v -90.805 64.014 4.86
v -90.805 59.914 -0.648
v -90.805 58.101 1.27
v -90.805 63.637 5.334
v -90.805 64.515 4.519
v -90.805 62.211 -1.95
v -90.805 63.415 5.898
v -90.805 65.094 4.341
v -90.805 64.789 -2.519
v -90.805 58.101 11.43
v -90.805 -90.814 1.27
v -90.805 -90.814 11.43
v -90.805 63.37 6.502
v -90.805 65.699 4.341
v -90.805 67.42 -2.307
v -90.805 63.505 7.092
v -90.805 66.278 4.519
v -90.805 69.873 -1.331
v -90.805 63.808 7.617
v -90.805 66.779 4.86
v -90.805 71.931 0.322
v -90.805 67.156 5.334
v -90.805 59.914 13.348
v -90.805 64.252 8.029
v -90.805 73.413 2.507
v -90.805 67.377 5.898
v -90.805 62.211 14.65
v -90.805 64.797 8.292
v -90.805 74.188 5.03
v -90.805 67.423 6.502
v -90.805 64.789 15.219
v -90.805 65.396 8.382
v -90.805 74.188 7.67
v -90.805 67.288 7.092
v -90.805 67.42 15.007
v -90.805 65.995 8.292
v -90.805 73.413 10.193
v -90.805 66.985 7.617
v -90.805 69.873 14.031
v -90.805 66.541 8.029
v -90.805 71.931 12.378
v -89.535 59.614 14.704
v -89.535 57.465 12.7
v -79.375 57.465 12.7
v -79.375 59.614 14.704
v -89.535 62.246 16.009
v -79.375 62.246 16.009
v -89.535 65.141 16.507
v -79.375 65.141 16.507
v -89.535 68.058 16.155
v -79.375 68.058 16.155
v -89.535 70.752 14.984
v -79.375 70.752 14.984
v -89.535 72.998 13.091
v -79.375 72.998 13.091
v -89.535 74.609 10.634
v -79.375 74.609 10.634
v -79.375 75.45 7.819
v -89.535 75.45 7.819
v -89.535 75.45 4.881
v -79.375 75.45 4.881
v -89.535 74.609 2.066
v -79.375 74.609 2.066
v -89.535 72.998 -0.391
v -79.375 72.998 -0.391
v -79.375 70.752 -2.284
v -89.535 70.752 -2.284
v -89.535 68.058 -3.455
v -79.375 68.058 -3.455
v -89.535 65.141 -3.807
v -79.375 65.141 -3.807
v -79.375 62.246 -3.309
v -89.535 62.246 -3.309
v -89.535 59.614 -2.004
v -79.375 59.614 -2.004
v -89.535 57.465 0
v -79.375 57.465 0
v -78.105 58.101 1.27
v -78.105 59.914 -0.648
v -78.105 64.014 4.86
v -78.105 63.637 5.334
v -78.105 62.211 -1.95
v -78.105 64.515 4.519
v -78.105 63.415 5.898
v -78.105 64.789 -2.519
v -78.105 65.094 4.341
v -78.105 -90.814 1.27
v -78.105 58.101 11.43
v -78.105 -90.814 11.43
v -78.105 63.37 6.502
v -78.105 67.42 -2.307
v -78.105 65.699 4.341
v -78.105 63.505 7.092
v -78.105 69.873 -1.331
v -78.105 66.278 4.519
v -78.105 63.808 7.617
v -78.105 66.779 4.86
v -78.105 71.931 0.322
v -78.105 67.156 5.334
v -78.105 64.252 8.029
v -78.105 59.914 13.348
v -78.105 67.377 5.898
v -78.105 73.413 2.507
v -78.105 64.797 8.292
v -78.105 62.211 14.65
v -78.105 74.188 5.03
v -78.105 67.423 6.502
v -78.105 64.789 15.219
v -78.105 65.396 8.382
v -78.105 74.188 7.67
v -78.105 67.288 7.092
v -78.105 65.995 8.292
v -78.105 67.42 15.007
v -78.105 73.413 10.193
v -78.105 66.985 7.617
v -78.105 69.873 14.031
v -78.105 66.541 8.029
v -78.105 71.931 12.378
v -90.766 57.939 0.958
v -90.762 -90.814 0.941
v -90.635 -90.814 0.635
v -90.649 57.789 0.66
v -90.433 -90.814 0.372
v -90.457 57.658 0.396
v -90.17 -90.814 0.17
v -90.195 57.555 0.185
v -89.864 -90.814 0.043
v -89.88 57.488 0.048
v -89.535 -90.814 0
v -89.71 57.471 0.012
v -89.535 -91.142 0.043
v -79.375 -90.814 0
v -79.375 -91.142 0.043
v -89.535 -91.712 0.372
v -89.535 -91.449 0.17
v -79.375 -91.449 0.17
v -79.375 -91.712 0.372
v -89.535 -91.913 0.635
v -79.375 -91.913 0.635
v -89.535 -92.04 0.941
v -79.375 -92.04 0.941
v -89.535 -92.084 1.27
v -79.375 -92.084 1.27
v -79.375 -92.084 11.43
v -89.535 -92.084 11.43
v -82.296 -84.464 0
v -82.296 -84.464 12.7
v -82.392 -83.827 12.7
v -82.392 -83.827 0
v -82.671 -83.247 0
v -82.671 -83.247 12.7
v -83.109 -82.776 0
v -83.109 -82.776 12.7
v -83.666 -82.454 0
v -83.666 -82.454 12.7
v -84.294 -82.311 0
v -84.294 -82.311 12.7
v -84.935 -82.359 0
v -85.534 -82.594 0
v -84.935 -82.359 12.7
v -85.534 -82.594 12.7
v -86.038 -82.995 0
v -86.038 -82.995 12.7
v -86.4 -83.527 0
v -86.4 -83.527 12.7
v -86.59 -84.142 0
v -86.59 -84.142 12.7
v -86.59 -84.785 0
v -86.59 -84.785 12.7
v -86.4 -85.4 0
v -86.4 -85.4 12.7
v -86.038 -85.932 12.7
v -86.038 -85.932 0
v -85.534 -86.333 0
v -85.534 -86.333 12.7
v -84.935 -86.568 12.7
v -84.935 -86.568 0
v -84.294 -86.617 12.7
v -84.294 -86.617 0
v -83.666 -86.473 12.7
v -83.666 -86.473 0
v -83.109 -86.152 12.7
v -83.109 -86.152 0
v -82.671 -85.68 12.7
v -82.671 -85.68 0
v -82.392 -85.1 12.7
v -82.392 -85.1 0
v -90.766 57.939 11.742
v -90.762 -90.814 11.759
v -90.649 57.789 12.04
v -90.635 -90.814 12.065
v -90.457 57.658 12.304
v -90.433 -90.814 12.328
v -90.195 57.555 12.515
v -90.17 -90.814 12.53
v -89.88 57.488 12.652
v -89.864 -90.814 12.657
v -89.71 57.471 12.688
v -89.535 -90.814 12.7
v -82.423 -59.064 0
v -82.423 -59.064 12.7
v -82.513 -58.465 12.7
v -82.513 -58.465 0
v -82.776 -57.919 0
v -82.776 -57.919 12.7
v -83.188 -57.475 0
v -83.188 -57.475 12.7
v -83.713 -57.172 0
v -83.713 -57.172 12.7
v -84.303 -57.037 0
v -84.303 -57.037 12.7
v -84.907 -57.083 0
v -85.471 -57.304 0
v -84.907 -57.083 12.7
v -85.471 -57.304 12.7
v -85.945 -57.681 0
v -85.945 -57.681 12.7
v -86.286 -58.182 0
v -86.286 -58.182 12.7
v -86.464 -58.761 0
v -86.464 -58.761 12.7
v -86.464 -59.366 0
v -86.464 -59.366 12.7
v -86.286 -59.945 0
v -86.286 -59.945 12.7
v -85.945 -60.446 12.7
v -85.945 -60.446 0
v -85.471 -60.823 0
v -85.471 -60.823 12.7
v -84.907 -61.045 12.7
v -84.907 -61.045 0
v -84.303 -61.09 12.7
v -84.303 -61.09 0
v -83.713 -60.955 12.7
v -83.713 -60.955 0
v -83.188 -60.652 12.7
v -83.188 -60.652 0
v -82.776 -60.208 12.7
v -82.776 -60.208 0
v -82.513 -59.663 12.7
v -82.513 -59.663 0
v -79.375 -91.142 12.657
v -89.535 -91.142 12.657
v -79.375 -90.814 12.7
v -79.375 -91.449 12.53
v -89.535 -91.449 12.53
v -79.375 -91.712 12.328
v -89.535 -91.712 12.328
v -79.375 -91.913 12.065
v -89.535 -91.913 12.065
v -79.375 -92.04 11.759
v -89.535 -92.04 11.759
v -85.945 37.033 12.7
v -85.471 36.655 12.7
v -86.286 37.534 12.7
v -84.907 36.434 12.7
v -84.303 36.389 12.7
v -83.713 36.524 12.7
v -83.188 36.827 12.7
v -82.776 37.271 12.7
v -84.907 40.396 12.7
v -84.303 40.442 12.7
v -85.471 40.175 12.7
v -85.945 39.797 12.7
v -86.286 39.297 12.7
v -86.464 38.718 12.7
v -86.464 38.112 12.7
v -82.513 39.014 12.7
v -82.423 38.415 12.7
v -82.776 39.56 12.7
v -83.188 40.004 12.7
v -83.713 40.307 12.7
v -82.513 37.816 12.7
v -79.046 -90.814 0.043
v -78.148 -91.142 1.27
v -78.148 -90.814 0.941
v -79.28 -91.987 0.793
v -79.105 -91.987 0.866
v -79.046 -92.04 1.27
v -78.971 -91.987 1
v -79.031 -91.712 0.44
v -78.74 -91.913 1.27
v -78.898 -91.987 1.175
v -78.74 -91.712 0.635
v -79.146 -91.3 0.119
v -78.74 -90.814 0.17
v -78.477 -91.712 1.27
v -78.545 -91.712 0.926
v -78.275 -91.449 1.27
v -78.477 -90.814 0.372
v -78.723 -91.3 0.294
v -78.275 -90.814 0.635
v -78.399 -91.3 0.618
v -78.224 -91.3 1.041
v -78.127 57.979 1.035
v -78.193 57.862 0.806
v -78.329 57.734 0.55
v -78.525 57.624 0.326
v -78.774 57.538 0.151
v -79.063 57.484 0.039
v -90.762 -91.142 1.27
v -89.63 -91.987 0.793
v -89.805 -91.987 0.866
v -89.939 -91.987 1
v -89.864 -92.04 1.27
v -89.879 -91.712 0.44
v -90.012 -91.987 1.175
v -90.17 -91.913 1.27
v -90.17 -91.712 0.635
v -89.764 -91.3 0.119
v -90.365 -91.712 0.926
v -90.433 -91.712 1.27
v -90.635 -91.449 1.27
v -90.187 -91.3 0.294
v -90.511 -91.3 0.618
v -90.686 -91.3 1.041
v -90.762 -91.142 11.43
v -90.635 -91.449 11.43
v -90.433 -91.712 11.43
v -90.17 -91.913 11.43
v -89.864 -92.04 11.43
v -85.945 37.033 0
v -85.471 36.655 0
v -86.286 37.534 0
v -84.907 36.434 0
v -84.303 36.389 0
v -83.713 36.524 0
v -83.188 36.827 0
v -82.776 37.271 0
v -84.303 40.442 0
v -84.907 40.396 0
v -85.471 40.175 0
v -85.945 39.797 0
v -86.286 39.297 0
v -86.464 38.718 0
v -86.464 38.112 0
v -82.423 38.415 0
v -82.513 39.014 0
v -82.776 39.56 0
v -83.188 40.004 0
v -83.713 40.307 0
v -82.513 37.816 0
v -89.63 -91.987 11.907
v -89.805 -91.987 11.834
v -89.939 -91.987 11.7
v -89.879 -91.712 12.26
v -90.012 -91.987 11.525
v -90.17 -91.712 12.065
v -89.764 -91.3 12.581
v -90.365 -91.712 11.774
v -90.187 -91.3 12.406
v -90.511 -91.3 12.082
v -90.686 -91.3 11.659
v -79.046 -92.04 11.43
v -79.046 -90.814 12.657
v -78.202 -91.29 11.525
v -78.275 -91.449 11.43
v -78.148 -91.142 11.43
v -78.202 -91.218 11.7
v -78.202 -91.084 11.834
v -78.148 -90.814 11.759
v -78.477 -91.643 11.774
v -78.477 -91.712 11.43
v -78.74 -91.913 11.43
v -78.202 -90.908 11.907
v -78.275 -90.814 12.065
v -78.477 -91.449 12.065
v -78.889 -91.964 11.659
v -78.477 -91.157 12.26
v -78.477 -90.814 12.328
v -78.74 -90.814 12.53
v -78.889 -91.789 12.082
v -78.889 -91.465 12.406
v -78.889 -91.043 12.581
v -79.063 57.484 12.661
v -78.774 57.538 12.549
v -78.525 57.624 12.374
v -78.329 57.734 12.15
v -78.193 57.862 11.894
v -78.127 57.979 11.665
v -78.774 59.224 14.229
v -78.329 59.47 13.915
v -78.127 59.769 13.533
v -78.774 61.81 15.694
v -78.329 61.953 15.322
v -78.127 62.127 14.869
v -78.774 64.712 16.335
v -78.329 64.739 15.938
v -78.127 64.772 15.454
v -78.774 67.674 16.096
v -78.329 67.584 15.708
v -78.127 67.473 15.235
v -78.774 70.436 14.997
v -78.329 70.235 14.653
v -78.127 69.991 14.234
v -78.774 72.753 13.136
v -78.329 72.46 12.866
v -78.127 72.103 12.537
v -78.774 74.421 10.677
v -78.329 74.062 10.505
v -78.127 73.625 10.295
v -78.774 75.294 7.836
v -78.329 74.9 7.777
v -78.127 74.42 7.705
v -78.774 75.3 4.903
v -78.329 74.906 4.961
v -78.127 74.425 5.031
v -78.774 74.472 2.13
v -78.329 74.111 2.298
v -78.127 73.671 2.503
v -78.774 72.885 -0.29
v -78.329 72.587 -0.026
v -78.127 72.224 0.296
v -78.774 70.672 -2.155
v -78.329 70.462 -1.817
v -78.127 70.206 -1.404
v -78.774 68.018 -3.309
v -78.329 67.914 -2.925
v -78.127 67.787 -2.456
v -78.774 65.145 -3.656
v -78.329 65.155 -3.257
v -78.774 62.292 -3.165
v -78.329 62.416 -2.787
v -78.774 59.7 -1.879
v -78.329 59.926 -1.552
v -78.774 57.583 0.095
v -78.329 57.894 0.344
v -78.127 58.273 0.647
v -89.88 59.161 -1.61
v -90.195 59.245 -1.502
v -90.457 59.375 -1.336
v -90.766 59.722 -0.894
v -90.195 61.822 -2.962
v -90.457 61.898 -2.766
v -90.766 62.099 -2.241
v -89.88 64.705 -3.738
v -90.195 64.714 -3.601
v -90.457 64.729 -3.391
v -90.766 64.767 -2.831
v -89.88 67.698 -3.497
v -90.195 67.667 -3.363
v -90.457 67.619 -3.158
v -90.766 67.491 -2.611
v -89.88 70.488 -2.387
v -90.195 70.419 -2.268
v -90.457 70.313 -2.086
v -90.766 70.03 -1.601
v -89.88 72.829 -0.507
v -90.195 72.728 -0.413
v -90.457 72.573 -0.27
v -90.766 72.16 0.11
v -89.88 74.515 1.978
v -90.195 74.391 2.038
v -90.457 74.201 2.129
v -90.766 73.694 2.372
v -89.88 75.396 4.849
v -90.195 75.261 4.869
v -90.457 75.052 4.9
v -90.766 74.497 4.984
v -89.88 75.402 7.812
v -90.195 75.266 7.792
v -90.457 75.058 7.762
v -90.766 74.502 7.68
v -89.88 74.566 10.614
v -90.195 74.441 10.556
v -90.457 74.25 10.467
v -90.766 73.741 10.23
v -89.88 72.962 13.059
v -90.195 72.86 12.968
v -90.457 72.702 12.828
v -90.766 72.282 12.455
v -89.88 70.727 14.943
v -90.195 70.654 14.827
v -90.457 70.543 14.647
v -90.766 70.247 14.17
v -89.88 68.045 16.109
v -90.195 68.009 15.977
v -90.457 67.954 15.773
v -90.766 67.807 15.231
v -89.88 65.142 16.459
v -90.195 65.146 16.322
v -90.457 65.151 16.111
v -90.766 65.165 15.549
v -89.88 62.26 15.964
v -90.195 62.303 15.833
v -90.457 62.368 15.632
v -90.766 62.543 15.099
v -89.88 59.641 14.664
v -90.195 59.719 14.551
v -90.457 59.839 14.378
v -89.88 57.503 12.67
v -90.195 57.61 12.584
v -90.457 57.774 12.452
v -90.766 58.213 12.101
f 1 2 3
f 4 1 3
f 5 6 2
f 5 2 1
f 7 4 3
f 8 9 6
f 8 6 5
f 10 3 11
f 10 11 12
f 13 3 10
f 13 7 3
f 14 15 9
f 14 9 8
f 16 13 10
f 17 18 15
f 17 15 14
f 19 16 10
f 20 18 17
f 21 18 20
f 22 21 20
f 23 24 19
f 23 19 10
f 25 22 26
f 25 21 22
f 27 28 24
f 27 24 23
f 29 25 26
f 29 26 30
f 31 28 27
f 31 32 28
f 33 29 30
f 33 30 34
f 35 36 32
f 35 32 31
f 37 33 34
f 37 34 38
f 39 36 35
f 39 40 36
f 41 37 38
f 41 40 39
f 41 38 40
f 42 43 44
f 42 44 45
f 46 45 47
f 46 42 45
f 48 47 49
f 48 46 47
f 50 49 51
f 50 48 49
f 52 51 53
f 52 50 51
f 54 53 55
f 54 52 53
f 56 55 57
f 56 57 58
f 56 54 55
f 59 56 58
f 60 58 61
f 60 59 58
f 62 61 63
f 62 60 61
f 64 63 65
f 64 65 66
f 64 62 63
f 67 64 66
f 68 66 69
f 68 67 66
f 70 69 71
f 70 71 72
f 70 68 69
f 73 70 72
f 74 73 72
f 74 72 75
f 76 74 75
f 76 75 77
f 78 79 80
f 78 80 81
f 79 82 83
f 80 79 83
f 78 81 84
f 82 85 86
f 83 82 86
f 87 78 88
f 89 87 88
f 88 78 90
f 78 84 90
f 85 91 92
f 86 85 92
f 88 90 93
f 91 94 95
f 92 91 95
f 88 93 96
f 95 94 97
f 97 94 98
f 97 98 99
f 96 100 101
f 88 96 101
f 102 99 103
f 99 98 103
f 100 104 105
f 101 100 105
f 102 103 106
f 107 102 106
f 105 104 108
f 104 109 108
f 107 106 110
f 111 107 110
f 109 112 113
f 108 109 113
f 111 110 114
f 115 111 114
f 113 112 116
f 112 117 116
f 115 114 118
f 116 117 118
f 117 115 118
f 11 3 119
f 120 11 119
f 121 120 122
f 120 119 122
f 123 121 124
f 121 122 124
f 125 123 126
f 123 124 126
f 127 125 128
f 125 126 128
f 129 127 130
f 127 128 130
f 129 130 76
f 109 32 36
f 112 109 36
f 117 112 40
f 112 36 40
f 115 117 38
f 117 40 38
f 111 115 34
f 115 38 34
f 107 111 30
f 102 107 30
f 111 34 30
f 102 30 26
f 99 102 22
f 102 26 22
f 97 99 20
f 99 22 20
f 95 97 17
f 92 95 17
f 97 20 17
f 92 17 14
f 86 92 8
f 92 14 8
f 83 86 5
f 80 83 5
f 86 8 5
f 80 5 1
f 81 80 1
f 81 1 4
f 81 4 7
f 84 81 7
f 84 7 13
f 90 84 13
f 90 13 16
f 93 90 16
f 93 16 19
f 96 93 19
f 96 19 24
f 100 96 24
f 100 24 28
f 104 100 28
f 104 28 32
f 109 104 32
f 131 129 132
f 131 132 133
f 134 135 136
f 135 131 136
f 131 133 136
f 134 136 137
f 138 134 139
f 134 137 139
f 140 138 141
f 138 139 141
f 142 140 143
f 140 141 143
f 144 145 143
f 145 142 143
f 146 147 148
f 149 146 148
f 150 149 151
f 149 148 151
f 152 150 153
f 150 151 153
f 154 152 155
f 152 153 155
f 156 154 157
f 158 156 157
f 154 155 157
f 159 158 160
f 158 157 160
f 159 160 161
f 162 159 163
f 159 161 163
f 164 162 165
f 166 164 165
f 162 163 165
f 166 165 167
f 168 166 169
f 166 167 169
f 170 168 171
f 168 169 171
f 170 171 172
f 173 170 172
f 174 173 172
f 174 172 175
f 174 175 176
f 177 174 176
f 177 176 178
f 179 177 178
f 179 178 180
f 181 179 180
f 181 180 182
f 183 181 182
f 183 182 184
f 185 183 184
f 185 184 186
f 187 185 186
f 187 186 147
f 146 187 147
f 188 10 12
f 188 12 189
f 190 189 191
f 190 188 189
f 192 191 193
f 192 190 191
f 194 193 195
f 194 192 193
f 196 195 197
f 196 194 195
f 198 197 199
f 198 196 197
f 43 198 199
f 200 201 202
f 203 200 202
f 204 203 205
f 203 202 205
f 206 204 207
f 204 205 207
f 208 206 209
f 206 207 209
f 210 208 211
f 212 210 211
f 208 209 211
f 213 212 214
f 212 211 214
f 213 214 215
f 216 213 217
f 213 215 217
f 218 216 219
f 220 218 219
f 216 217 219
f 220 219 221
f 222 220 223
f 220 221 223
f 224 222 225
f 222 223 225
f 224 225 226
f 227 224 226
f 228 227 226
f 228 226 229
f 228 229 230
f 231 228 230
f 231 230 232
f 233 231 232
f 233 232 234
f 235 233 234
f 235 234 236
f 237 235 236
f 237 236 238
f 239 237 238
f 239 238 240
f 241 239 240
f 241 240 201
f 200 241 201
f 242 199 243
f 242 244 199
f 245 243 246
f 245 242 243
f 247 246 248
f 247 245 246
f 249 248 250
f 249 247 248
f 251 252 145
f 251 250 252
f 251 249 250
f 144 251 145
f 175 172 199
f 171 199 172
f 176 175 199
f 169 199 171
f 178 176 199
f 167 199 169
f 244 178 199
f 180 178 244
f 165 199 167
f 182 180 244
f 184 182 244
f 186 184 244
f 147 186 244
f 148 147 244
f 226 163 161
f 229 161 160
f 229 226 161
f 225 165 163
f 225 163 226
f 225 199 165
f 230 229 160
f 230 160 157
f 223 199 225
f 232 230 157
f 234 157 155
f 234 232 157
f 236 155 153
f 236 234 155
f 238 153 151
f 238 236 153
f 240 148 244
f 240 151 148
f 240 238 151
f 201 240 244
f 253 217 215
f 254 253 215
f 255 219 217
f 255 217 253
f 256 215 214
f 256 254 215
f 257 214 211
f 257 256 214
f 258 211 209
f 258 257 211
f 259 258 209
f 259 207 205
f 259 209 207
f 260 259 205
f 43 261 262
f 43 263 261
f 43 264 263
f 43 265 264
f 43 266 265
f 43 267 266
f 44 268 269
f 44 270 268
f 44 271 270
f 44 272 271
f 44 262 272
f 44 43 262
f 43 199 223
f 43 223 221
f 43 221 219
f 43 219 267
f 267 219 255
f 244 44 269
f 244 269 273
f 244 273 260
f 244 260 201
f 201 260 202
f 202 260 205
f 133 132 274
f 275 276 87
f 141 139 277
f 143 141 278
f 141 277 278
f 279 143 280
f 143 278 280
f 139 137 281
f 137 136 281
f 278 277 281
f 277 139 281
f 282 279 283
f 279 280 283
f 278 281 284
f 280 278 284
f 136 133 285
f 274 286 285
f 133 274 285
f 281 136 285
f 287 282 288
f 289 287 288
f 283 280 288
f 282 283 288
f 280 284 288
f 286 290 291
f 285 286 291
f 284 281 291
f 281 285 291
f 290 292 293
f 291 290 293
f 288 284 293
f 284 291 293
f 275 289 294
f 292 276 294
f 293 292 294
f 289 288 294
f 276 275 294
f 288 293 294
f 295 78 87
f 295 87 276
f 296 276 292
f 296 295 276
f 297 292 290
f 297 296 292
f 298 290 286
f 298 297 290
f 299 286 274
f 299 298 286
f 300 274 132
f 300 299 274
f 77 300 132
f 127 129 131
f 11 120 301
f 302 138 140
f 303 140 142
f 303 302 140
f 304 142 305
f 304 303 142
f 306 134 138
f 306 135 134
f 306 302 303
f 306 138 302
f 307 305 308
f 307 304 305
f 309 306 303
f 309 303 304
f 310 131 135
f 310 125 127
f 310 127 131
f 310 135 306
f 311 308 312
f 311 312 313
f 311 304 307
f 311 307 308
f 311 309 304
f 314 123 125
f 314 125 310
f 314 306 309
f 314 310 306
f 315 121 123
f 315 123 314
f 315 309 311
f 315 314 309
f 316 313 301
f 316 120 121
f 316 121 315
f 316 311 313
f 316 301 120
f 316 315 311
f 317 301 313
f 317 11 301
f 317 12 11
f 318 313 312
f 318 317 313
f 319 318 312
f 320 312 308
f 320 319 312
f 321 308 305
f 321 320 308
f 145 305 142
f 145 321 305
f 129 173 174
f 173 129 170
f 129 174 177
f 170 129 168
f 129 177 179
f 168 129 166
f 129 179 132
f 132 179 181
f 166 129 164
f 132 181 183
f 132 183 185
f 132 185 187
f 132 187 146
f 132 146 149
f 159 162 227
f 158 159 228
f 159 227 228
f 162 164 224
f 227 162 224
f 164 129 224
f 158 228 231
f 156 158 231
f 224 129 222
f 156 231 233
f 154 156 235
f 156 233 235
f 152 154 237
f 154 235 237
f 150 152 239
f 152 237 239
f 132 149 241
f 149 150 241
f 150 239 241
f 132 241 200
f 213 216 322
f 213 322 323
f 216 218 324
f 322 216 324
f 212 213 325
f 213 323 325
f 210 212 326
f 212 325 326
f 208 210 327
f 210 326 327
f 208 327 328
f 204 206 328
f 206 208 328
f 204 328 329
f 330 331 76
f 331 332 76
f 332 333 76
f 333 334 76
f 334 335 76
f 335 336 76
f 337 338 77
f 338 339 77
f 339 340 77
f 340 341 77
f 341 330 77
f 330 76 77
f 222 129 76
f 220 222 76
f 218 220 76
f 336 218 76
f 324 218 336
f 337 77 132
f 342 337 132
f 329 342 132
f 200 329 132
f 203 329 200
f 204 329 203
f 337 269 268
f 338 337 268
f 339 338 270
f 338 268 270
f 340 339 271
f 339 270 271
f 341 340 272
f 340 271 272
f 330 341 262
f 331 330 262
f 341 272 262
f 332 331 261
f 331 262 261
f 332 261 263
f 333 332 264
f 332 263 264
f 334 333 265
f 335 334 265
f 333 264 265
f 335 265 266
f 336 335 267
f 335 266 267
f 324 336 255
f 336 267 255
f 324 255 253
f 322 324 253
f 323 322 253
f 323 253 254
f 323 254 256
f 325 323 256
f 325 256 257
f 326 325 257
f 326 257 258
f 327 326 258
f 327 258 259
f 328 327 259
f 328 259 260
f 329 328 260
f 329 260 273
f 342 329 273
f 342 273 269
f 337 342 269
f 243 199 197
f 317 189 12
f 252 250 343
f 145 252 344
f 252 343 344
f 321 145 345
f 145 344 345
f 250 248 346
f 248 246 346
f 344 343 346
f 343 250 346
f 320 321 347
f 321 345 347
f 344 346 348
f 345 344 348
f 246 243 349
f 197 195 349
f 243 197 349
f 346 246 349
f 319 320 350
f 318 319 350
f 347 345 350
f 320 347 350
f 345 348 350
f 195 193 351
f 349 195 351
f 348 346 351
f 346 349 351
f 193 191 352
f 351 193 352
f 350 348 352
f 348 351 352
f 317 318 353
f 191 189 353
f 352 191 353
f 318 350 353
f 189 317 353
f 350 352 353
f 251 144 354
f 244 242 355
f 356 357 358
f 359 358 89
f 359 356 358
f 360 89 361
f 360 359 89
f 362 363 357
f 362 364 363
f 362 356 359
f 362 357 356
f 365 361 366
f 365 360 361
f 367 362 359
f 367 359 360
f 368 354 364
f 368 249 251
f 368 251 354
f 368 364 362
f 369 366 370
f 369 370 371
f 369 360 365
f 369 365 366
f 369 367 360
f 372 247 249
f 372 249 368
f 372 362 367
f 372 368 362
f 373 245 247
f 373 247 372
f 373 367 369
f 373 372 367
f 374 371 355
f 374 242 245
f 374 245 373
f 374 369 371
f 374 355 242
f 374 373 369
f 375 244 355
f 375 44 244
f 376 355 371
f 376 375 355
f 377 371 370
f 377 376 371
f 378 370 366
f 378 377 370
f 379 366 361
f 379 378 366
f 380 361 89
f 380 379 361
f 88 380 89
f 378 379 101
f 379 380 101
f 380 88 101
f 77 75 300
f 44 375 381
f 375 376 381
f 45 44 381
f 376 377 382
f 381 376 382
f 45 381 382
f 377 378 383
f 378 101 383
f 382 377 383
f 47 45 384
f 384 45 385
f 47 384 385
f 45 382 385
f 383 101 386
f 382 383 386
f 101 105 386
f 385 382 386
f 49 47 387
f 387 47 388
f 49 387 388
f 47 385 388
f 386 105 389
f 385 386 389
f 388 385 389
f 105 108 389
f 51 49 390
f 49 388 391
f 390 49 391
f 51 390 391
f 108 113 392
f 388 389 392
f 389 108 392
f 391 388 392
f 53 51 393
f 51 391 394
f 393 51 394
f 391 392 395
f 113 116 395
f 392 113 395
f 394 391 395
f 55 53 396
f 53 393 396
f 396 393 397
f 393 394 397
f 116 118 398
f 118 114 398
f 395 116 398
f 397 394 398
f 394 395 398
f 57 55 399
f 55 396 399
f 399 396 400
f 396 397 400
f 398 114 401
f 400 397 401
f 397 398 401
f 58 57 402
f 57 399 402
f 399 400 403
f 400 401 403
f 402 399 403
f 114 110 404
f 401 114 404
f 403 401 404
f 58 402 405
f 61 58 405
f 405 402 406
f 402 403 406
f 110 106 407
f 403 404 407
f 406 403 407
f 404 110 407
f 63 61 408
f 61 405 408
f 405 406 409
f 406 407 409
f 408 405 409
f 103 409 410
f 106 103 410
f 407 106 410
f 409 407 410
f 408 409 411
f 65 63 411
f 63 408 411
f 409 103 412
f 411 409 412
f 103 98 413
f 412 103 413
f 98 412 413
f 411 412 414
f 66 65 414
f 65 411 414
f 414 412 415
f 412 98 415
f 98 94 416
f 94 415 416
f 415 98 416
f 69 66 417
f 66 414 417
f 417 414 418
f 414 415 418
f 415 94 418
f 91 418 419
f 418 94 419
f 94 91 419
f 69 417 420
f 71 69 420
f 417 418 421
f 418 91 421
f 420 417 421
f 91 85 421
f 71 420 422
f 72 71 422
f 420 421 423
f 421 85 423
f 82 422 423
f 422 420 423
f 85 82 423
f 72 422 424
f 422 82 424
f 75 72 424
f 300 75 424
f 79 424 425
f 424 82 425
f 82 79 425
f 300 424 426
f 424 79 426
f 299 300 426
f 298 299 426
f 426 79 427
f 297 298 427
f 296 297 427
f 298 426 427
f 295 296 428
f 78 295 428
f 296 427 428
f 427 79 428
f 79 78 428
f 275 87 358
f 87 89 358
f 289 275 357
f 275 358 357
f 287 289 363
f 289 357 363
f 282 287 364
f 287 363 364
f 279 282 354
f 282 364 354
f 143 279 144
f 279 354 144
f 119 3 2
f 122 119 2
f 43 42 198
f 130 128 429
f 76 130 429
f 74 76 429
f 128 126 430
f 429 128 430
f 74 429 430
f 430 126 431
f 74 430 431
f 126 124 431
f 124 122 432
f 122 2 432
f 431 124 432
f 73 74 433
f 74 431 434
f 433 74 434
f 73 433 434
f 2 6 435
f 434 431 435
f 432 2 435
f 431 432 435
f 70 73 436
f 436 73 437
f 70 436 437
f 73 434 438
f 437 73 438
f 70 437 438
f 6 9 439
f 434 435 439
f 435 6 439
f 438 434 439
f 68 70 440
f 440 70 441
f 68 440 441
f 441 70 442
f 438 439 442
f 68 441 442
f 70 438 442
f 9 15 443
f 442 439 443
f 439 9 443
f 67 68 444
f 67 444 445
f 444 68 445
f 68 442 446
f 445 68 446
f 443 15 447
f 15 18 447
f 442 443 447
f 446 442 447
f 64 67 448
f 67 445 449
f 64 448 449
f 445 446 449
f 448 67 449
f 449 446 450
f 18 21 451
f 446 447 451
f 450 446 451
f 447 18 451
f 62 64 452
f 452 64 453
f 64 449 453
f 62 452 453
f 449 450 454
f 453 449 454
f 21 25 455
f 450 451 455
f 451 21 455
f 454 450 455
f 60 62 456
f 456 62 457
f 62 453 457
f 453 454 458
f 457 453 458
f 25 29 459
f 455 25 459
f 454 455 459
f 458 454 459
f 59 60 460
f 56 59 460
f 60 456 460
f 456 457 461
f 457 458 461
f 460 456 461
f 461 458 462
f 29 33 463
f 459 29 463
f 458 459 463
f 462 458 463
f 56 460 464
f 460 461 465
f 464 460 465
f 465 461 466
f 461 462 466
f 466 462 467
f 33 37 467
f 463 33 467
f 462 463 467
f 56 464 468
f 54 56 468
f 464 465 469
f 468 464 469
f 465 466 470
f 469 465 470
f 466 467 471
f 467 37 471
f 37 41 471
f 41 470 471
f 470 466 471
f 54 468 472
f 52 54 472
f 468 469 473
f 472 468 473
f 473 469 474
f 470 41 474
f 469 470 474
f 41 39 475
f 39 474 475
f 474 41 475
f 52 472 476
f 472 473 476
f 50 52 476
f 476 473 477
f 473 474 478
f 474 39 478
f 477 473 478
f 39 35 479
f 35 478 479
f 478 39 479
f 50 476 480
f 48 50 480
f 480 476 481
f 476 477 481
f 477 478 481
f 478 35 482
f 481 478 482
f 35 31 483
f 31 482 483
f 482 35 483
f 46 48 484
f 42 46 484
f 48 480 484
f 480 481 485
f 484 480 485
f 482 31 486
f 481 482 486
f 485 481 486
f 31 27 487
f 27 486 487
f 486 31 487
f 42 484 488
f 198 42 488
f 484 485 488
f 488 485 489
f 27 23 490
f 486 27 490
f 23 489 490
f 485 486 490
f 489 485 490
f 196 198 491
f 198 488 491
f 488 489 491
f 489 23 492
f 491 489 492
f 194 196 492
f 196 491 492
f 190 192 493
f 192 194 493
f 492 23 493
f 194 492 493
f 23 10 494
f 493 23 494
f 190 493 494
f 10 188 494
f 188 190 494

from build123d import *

# Parameters (mm, degrees)
SKETCH2_W           = 12.7
SKETCH2_H           = 165.1
BOSS_EXTRUDE1_DEPTH = 12.7
SKETCH4_R           = 10.16
BOSS_EXTRUDE2_DEPTH = 12.7
SKETCH5_R           = 2.032
CUT_EXTRUDE2_DEPTH  = 95.410065275
SKETCH6_R           = 2.159
CUT_EXTRUDE4_DEPTH  = 131.374531448
FILLET1_R           = 1.27
SKETCH7_R           = 2.032
CUT_EXTRUDE5_DEPTH  = 131.37453153


with BuildPart() as part:
    # Sketch2 → Boss-Extrude1 (new body)
    with BuildSketch(Plane.XY):
        with Locations((-84.455, -9.533605084)):
            Rectangle(SKETCH2_W, SKETCH2_H)
    extrude(amount=BOSS_EXTRUDE1_DEPTH)

    # Sketch4 → Boss-Extrude2 (add)
    with BuildSketch(Plane.ZY.offset(90.805)):
        with Locations((6.35, 65.396394916)):
            Circle(SKETCH4_R)
    extrude(amount=-BOSS_EXTRUDE2_DEPTH)

    # Sketch5 → Cut-Extrude2 (cut, through all)
    with BuildSketch(Plane.ZY.offset(90.805)):
        with Locations((6.35, 65.396394916)):
            Circle(SKETCH5_R)
    extrude(amount=-CUT_EXTRUDE2_DEPTH, mode=Mode.SUBTRACT)

    # Sketch6 → Cut-Extrude4 (cut, through all)
    with BuildSketch(Plane.XY.offset(12.7)):
        with Locations((-84.455, -84.463605084)):
            Circle(SKETCH6_R)
        with Locations((84.455, -84.463605084)):
            Circle(SKETCH6_R)
    extrude(amount=-CUT_EXTRUDE4_DEPTH, mode=Mode.SUBTRACT)

    # Fillet1
    fillet1_edges = [part.edges().sort_by_distance(p)[0] for p in [
        (-90.805, -17.309178813, 0),
        (-90.805, -17.309178813, 12.7),
        (-90.805, 75.556394916, 6.35),
        (-78.105, 75.556394916, 6.35),
        (-84.455, -92.083605084, 12.7),
        (-78.105, -17.309178813, 0),
        (-84.455, -92.083605084, 0),
        (-90.805, -92.083605084, 6.35),
        (-78.105, -92.083605084, 6.35),
        (-78.105, -17.309178813, 12.7),
    ]]
    fillet(fillet1_edges, radius=FILLET1_R)

    # Sketch7 → Cut-Extrude5 (cut, through all)
    with BuildSketch(Plane.XY.offset(12.7)):
        with Locations((-84.455, -59.063605084)):
            Circle(SKETCH7_R)
        with Locations((-84.455, 38.415247458)):
            Circle(SKETCH7_R)
        with Locations((84.455, -59.063605084)):
            Circle(SKETCH7_R)
        with Locations((84.455, 38.415247458)):
            Circle(SKETCH7_R)
    extrude(amount=-CUT_EXTRUDE5_DEPTH, mode=Mode.SUBTRACT)


solid = part.part
